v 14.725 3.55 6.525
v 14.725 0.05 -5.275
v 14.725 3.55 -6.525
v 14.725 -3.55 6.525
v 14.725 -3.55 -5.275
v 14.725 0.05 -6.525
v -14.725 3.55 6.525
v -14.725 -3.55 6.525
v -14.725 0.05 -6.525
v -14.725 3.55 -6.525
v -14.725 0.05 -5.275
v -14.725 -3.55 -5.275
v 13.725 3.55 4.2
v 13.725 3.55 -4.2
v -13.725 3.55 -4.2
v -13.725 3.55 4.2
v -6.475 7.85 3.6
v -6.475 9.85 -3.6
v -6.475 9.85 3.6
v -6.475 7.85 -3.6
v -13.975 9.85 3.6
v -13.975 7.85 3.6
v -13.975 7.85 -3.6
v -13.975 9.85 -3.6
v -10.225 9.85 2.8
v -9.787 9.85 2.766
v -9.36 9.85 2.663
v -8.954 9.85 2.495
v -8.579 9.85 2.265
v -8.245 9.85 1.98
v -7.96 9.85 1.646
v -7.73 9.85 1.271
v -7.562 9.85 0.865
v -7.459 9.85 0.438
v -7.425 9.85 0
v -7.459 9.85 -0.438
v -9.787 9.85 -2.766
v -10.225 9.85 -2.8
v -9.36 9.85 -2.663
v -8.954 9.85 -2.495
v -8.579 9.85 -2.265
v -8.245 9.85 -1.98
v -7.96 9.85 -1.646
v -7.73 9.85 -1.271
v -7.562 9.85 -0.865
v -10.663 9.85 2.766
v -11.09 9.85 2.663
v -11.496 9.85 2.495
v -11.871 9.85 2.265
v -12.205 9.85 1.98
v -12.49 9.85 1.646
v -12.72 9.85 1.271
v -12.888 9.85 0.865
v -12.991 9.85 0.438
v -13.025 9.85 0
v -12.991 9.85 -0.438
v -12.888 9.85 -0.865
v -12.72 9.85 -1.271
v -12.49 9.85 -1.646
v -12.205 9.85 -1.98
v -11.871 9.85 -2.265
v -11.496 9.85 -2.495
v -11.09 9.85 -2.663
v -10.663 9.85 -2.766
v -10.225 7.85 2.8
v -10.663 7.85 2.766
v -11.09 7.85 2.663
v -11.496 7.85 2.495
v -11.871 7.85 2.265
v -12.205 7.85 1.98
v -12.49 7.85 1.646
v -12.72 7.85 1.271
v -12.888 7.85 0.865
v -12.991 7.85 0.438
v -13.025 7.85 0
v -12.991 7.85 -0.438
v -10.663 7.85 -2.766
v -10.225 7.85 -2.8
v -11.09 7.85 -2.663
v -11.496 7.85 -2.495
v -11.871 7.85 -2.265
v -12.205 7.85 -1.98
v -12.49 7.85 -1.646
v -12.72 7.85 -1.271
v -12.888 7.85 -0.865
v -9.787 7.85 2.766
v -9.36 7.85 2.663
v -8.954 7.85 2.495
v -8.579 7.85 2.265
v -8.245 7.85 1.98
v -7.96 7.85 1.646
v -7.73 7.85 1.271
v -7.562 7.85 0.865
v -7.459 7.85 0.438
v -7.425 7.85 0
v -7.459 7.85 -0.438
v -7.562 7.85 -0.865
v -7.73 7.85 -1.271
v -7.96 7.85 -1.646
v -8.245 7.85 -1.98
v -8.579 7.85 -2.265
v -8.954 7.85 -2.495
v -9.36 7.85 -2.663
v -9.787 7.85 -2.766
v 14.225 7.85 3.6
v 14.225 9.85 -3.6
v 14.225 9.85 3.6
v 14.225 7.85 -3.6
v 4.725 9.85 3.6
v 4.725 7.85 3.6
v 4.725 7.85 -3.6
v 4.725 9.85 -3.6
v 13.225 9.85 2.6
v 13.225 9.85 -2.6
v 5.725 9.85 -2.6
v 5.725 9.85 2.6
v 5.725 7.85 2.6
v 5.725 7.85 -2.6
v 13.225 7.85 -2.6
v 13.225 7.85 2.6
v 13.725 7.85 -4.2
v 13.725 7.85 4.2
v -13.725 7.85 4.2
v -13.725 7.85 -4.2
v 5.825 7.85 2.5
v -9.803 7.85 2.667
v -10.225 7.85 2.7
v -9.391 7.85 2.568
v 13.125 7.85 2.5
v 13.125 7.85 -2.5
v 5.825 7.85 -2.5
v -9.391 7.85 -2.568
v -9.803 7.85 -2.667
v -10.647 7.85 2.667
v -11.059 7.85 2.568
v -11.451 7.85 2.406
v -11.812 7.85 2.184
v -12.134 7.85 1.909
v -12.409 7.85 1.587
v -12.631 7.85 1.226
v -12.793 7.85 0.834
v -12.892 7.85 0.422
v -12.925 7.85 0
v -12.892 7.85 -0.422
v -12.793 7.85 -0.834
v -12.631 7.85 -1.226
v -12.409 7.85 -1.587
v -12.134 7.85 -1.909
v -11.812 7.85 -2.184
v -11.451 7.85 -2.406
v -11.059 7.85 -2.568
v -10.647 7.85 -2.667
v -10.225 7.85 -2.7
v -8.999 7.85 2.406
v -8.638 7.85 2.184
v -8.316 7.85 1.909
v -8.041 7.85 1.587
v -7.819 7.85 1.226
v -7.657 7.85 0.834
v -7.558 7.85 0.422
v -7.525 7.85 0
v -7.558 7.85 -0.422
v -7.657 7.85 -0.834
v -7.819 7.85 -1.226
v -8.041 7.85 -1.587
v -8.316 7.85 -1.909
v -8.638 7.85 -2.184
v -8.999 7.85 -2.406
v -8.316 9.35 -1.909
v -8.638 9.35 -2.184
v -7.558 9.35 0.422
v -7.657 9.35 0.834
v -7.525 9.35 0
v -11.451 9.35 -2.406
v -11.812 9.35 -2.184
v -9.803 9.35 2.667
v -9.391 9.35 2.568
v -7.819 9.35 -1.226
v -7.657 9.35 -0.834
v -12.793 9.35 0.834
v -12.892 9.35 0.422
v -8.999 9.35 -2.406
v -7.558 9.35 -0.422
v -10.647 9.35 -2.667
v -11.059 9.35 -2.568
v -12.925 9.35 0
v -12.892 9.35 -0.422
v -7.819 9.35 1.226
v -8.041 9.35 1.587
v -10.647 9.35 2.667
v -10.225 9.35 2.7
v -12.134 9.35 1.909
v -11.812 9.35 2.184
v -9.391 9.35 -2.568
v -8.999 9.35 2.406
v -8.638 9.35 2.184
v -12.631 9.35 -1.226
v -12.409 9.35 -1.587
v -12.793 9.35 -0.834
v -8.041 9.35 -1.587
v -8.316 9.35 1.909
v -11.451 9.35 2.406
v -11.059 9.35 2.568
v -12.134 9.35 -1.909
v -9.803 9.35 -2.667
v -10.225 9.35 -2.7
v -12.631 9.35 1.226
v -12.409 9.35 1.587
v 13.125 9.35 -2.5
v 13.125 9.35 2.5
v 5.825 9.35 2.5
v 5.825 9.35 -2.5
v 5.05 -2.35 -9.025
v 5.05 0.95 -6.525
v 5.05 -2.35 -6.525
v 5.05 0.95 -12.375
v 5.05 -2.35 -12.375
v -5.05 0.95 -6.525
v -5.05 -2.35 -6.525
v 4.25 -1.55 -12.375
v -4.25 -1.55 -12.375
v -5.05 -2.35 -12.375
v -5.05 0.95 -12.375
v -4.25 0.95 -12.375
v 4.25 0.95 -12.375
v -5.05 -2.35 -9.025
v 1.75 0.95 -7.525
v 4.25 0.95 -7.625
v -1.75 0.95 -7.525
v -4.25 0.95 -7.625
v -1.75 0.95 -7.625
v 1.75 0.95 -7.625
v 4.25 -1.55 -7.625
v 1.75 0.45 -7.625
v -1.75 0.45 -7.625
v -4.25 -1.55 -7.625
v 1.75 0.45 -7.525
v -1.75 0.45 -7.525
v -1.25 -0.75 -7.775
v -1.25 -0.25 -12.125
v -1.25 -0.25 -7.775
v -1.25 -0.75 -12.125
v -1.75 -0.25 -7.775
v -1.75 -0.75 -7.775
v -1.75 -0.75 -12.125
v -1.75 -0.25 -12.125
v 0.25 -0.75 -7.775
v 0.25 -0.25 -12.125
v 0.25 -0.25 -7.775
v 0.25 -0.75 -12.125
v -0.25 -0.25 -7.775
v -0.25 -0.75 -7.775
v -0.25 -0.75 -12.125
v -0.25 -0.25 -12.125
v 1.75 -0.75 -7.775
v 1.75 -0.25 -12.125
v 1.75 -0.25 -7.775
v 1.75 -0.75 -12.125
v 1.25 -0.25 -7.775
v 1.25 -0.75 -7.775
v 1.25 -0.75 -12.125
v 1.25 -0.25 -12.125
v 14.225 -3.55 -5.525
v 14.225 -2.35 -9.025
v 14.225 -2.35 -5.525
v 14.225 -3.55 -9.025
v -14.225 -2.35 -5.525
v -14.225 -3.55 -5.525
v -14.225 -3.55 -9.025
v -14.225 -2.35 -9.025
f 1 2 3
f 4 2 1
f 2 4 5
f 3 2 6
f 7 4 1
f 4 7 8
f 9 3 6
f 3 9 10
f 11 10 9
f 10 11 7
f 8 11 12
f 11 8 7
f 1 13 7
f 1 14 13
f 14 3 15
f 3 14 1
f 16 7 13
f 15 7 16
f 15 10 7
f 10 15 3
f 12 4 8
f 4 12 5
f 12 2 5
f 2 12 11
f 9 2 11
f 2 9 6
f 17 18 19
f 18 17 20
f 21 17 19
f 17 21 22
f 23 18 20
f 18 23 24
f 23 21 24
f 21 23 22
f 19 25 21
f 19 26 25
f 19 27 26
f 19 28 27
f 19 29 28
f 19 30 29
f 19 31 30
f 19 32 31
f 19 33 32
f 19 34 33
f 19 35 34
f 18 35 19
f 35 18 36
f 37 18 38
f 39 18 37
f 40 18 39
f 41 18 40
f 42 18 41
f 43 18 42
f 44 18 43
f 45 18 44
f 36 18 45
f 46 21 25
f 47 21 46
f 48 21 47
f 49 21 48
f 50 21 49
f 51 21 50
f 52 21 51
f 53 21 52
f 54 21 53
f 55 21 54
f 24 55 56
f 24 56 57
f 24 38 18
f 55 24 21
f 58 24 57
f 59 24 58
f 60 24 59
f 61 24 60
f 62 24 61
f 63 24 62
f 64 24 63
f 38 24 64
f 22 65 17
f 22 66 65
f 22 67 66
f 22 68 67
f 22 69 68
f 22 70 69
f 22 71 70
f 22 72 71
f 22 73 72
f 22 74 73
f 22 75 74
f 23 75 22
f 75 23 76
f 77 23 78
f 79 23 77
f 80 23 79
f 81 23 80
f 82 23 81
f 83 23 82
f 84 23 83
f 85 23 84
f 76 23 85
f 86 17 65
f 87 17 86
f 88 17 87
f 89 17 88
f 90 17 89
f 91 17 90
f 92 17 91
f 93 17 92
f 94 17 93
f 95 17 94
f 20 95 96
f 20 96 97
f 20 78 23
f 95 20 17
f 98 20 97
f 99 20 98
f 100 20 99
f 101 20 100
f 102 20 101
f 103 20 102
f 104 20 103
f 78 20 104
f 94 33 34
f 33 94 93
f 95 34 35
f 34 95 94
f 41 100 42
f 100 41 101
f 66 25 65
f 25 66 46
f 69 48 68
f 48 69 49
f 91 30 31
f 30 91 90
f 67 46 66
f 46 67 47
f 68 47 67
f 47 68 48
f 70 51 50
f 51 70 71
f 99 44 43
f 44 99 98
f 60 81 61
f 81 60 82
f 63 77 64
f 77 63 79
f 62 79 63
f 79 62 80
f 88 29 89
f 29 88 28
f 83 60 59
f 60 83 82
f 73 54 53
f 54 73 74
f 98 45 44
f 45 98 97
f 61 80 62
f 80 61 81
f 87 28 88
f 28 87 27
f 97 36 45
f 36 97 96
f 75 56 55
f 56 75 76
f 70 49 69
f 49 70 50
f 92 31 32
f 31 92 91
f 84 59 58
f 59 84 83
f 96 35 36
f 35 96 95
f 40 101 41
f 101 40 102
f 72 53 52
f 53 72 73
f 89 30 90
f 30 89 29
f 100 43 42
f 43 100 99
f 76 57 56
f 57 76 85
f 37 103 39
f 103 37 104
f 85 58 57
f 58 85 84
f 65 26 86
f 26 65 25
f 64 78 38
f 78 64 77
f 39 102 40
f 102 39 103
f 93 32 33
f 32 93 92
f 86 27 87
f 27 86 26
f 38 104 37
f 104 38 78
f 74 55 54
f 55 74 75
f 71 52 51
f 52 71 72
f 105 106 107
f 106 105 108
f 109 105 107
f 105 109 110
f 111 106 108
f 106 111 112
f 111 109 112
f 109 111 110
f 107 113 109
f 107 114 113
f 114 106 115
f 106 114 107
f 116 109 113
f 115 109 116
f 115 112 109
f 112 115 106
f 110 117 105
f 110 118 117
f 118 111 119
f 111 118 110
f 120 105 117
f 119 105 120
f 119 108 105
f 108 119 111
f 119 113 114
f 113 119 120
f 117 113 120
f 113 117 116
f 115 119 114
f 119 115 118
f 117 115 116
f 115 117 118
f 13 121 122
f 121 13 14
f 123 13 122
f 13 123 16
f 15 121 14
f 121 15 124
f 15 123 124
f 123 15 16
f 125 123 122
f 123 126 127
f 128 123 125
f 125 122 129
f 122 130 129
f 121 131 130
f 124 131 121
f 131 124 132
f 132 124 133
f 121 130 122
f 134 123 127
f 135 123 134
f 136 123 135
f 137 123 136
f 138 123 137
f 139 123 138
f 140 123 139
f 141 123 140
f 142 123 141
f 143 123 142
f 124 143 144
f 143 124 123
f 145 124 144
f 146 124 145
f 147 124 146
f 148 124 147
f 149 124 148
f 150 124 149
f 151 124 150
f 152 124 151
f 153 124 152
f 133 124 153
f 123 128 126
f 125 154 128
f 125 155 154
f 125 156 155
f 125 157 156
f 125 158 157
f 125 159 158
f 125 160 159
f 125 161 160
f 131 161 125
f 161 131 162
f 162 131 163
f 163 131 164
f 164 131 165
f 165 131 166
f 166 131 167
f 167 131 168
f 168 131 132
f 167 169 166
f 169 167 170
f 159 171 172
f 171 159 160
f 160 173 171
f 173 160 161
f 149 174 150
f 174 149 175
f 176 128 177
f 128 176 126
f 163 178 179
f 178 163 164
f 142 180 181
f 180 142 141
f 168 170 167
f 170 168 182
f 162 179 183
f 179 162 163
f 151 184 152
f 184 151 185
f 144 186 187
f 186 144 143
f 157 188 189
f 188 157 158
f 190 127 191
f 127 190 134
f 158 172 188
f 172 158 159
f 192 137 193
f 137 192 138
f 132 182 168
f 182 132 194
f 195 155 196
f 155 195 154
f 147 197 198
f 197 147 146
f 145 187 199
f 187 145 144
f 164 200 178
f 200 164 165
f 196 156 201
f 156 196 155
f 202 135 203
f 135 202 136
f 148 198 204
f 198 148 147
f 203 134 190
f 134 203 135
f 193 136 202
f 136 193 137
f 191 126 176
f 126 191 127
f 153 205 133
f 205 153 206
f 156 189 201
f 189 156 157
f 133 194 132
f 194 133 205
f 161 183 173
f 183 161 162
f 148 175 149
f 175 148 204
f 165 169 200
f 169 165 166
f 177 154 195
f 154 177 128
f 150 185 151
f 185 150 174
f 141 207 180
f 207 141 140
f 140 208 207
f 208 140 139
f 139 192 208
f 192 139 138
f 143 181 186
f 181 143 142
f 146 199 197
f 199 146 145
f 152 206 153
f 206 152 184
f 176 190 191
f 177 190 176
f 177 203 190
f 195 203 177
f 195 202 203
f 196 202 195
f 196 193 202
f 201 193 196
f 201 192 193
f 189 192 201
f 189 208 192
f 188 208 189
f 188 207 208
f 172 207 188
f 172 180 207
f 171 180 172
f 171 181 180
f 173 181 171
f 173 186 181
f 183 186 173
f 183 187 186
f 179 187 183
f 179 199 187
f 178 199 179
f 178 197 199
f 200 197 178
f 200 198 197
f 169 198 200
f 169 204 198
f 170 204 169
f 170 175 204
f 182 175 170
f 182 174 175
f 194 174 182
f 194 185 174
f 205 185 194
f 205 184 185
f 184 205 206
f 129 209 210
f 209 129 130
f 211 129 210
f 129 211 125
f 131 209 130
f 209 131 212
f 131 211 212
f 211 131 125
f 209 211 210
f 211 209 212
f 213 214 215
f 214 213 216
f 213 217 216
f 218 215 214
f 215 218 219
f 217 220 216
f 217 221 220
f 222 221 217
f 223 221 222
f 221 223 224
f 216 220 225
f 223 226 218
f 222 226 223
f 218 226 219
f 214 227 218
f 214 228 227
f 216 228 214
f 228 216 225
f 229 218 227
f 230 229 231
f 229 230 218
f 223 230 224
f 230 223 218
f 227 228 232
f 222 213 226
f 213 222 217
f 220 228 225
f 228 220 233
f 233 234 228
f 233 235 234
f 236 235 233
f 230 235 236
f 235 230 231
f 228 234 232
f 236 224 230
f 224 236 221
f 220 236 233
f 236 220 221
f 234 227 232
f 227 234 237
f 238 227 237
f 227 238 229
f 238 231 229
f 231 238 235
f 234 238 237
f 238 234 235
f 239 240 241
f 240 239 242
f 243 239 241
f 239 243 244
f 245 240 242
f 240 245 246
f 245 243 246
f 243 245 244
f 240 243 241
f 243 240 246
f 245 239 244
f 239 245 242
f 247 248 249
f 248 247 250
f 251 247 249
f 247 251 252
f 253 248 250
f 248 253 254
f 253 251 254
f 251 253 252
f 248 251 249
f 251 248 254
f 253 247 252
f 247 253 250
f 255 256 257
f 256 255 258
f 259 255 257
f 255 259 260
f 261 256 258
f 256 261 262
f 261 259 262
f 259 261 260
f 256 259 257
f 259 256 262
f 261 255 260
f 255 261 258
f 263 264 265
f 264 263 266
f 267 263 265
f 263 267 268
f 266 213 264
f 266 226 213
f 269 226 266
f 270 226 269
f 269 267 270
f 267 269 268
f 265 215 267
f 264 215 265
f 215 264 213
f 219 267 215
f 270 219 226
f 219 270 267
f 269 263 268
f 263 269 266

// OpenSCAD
// Sharp GP2Y0D413K0F Distance Measuring Sensor
// Units in mm, Origin at the center of the main case body

$fn = 40;

// Dimensions from datasheet
body_w = 29.45;
body_d = 7.1;
body_h = 13.05;

lens_case_h_base = 8.4;
lens_case_h_tip  = 7.2;
lens_case_ext_base = 4.3; // 6.3 - 2.0
lens_case_ext_tip  = 2.0;

// Lens center positions (from left edge: *4.5mm and *19.7mm spacing)
x_left = -body_w / 2;
x_emitter  = x_left + 4.5;          // -10.225
x_detector = x_emitter + 19.7;      // +9.475

// Colors
col_case      = [0.18, 0.18, 0.18]; // Carbonic ABS (conductive resin)
col_lens      = [0.25, 0.05, 0.08, 0.85]; // Acrylic visible light cut-off resin
col_pwb       = [0.45, 0.32, 0.15]; // Paper phenol
col_connector = [0.92, 0.90, 0.82]; // JCTC connector housing
col_pin       = [0.85, 0.75, 0.30]; // Metal pins

module main_case() {
    color(col_case) {
        difference() {
            // Main body block
            cube([body_w, body_d, body_h], center=true);
            
            // Bottom cutout for PWB & connector
            translate([0, -body_d/4, -body_h/2])
                cube([body_w + 1, body_d/2 + 0.1, 2.5], center=true);
        }
    }
}

module lens_case() {
    color(col_case) {
        // Base protrusion of lens case
        translate([0, body_d/2 + lens_case_ext_base/2, 0])
            cube([body_w - 2, lens_case_ext_base, lens_case_h_base], center=true);
        
        // Emitter hood (Left)
        translate([x_emitter, body_d/2 + lens_case_ext_base + lens_case_ext_tip/2, 0])
            difference() {
                cube([7.5, lens_case_ext_tip, lens_case_h_tip], center=true);
                // Aperture cutout
                translate([0, 0.5, 0])
                    rotate([90, 0, 0])
                        cylinder(d=5.6, h=lens_case_ext_tip + 1, center=true);
            }

        // Detector hood (Right)
        translate([x_detector, body_d/2 + lens_case_ext_base + lens_case_ext_tip/2, 0])
            difference() {
                cube([9.5, lens_case_ext_tip, lens_case_h_tip], center=true);
                // Rectangular aperture cutout
                translate([0, 0.5, 0])
                    cube([7.5, lens_case_ext_tip + 1, 5.2], center=true);
            }
    }
}

module lenses() {
    color(col_lens) {
        // Emitter Lens (Circular convex)
        translate([x_emitter, body_d/2 + lens_case_ext_base + 0.5, 0])
            rotate([90, 0, 0])
                cylinder(d=5.4, h=2.0, center=true);

        // Detector Lens (Rectangular / Cylindrical)
        translate([x_detector, body_d/2 + lens_case_ext_base + 0.5, 0])
            cube([7.3, 2.0, 5.0], center=true);
    }
}

module pwb() {
    color(col_pwb) {
        // PWB plate on bottom rear
        translate([0, -body_d/2 + 1.2/2, -body_h/2 - 1.5/2])
            cube([body_w - 1.0, 1.2, 3.5], center=true);
    }
}

module connector() {
    conn_w = 10.1;
    conn_d = 3.3;
    conn_h = 5.85; // 18.9 (total height) - 13.05 (body height)
    
    // Housing
    color(col_connector) {
        translate([0, -body_d/2 + 1.2 + conn_d/2, -body_h/2 - conn_h/2]) {
            difference() {
                cube([conn_w, conn_d, conn_h], center=true);
                // Cavity
                translate([0, 0.4, -0.6])
                    cube([conn_w - 1.6, conn_d - 0.8, conn_h - 1.0], center=true);
                // Key notch on front
                translate([0, conn_d/2, -1.0])
                    cube([3.5, 1.0, conn_h], center=true);
            }
        }
    }

    // 3 Pins (1: Vo, 2: GND, 3: Vcc) - Pitch ~ 1.5mm
    color(col_pin) {
        for (i = [-1:1]) {
            translate([i * 1.5, -body_d/2 + 1.2 + conn_d/2 + 0.2, -body_h/2 - conn_h/2 - 0.5])
                cube([0.5, 0.5, conn_h - 1.5], center=true);
        }
    }
}

// Top-level assembly
module gp2y0d413k0f() {
    main_case();
    lens_case();
    lenses();
    pwb();
    connector();
}

gp2y0d413k0f();
